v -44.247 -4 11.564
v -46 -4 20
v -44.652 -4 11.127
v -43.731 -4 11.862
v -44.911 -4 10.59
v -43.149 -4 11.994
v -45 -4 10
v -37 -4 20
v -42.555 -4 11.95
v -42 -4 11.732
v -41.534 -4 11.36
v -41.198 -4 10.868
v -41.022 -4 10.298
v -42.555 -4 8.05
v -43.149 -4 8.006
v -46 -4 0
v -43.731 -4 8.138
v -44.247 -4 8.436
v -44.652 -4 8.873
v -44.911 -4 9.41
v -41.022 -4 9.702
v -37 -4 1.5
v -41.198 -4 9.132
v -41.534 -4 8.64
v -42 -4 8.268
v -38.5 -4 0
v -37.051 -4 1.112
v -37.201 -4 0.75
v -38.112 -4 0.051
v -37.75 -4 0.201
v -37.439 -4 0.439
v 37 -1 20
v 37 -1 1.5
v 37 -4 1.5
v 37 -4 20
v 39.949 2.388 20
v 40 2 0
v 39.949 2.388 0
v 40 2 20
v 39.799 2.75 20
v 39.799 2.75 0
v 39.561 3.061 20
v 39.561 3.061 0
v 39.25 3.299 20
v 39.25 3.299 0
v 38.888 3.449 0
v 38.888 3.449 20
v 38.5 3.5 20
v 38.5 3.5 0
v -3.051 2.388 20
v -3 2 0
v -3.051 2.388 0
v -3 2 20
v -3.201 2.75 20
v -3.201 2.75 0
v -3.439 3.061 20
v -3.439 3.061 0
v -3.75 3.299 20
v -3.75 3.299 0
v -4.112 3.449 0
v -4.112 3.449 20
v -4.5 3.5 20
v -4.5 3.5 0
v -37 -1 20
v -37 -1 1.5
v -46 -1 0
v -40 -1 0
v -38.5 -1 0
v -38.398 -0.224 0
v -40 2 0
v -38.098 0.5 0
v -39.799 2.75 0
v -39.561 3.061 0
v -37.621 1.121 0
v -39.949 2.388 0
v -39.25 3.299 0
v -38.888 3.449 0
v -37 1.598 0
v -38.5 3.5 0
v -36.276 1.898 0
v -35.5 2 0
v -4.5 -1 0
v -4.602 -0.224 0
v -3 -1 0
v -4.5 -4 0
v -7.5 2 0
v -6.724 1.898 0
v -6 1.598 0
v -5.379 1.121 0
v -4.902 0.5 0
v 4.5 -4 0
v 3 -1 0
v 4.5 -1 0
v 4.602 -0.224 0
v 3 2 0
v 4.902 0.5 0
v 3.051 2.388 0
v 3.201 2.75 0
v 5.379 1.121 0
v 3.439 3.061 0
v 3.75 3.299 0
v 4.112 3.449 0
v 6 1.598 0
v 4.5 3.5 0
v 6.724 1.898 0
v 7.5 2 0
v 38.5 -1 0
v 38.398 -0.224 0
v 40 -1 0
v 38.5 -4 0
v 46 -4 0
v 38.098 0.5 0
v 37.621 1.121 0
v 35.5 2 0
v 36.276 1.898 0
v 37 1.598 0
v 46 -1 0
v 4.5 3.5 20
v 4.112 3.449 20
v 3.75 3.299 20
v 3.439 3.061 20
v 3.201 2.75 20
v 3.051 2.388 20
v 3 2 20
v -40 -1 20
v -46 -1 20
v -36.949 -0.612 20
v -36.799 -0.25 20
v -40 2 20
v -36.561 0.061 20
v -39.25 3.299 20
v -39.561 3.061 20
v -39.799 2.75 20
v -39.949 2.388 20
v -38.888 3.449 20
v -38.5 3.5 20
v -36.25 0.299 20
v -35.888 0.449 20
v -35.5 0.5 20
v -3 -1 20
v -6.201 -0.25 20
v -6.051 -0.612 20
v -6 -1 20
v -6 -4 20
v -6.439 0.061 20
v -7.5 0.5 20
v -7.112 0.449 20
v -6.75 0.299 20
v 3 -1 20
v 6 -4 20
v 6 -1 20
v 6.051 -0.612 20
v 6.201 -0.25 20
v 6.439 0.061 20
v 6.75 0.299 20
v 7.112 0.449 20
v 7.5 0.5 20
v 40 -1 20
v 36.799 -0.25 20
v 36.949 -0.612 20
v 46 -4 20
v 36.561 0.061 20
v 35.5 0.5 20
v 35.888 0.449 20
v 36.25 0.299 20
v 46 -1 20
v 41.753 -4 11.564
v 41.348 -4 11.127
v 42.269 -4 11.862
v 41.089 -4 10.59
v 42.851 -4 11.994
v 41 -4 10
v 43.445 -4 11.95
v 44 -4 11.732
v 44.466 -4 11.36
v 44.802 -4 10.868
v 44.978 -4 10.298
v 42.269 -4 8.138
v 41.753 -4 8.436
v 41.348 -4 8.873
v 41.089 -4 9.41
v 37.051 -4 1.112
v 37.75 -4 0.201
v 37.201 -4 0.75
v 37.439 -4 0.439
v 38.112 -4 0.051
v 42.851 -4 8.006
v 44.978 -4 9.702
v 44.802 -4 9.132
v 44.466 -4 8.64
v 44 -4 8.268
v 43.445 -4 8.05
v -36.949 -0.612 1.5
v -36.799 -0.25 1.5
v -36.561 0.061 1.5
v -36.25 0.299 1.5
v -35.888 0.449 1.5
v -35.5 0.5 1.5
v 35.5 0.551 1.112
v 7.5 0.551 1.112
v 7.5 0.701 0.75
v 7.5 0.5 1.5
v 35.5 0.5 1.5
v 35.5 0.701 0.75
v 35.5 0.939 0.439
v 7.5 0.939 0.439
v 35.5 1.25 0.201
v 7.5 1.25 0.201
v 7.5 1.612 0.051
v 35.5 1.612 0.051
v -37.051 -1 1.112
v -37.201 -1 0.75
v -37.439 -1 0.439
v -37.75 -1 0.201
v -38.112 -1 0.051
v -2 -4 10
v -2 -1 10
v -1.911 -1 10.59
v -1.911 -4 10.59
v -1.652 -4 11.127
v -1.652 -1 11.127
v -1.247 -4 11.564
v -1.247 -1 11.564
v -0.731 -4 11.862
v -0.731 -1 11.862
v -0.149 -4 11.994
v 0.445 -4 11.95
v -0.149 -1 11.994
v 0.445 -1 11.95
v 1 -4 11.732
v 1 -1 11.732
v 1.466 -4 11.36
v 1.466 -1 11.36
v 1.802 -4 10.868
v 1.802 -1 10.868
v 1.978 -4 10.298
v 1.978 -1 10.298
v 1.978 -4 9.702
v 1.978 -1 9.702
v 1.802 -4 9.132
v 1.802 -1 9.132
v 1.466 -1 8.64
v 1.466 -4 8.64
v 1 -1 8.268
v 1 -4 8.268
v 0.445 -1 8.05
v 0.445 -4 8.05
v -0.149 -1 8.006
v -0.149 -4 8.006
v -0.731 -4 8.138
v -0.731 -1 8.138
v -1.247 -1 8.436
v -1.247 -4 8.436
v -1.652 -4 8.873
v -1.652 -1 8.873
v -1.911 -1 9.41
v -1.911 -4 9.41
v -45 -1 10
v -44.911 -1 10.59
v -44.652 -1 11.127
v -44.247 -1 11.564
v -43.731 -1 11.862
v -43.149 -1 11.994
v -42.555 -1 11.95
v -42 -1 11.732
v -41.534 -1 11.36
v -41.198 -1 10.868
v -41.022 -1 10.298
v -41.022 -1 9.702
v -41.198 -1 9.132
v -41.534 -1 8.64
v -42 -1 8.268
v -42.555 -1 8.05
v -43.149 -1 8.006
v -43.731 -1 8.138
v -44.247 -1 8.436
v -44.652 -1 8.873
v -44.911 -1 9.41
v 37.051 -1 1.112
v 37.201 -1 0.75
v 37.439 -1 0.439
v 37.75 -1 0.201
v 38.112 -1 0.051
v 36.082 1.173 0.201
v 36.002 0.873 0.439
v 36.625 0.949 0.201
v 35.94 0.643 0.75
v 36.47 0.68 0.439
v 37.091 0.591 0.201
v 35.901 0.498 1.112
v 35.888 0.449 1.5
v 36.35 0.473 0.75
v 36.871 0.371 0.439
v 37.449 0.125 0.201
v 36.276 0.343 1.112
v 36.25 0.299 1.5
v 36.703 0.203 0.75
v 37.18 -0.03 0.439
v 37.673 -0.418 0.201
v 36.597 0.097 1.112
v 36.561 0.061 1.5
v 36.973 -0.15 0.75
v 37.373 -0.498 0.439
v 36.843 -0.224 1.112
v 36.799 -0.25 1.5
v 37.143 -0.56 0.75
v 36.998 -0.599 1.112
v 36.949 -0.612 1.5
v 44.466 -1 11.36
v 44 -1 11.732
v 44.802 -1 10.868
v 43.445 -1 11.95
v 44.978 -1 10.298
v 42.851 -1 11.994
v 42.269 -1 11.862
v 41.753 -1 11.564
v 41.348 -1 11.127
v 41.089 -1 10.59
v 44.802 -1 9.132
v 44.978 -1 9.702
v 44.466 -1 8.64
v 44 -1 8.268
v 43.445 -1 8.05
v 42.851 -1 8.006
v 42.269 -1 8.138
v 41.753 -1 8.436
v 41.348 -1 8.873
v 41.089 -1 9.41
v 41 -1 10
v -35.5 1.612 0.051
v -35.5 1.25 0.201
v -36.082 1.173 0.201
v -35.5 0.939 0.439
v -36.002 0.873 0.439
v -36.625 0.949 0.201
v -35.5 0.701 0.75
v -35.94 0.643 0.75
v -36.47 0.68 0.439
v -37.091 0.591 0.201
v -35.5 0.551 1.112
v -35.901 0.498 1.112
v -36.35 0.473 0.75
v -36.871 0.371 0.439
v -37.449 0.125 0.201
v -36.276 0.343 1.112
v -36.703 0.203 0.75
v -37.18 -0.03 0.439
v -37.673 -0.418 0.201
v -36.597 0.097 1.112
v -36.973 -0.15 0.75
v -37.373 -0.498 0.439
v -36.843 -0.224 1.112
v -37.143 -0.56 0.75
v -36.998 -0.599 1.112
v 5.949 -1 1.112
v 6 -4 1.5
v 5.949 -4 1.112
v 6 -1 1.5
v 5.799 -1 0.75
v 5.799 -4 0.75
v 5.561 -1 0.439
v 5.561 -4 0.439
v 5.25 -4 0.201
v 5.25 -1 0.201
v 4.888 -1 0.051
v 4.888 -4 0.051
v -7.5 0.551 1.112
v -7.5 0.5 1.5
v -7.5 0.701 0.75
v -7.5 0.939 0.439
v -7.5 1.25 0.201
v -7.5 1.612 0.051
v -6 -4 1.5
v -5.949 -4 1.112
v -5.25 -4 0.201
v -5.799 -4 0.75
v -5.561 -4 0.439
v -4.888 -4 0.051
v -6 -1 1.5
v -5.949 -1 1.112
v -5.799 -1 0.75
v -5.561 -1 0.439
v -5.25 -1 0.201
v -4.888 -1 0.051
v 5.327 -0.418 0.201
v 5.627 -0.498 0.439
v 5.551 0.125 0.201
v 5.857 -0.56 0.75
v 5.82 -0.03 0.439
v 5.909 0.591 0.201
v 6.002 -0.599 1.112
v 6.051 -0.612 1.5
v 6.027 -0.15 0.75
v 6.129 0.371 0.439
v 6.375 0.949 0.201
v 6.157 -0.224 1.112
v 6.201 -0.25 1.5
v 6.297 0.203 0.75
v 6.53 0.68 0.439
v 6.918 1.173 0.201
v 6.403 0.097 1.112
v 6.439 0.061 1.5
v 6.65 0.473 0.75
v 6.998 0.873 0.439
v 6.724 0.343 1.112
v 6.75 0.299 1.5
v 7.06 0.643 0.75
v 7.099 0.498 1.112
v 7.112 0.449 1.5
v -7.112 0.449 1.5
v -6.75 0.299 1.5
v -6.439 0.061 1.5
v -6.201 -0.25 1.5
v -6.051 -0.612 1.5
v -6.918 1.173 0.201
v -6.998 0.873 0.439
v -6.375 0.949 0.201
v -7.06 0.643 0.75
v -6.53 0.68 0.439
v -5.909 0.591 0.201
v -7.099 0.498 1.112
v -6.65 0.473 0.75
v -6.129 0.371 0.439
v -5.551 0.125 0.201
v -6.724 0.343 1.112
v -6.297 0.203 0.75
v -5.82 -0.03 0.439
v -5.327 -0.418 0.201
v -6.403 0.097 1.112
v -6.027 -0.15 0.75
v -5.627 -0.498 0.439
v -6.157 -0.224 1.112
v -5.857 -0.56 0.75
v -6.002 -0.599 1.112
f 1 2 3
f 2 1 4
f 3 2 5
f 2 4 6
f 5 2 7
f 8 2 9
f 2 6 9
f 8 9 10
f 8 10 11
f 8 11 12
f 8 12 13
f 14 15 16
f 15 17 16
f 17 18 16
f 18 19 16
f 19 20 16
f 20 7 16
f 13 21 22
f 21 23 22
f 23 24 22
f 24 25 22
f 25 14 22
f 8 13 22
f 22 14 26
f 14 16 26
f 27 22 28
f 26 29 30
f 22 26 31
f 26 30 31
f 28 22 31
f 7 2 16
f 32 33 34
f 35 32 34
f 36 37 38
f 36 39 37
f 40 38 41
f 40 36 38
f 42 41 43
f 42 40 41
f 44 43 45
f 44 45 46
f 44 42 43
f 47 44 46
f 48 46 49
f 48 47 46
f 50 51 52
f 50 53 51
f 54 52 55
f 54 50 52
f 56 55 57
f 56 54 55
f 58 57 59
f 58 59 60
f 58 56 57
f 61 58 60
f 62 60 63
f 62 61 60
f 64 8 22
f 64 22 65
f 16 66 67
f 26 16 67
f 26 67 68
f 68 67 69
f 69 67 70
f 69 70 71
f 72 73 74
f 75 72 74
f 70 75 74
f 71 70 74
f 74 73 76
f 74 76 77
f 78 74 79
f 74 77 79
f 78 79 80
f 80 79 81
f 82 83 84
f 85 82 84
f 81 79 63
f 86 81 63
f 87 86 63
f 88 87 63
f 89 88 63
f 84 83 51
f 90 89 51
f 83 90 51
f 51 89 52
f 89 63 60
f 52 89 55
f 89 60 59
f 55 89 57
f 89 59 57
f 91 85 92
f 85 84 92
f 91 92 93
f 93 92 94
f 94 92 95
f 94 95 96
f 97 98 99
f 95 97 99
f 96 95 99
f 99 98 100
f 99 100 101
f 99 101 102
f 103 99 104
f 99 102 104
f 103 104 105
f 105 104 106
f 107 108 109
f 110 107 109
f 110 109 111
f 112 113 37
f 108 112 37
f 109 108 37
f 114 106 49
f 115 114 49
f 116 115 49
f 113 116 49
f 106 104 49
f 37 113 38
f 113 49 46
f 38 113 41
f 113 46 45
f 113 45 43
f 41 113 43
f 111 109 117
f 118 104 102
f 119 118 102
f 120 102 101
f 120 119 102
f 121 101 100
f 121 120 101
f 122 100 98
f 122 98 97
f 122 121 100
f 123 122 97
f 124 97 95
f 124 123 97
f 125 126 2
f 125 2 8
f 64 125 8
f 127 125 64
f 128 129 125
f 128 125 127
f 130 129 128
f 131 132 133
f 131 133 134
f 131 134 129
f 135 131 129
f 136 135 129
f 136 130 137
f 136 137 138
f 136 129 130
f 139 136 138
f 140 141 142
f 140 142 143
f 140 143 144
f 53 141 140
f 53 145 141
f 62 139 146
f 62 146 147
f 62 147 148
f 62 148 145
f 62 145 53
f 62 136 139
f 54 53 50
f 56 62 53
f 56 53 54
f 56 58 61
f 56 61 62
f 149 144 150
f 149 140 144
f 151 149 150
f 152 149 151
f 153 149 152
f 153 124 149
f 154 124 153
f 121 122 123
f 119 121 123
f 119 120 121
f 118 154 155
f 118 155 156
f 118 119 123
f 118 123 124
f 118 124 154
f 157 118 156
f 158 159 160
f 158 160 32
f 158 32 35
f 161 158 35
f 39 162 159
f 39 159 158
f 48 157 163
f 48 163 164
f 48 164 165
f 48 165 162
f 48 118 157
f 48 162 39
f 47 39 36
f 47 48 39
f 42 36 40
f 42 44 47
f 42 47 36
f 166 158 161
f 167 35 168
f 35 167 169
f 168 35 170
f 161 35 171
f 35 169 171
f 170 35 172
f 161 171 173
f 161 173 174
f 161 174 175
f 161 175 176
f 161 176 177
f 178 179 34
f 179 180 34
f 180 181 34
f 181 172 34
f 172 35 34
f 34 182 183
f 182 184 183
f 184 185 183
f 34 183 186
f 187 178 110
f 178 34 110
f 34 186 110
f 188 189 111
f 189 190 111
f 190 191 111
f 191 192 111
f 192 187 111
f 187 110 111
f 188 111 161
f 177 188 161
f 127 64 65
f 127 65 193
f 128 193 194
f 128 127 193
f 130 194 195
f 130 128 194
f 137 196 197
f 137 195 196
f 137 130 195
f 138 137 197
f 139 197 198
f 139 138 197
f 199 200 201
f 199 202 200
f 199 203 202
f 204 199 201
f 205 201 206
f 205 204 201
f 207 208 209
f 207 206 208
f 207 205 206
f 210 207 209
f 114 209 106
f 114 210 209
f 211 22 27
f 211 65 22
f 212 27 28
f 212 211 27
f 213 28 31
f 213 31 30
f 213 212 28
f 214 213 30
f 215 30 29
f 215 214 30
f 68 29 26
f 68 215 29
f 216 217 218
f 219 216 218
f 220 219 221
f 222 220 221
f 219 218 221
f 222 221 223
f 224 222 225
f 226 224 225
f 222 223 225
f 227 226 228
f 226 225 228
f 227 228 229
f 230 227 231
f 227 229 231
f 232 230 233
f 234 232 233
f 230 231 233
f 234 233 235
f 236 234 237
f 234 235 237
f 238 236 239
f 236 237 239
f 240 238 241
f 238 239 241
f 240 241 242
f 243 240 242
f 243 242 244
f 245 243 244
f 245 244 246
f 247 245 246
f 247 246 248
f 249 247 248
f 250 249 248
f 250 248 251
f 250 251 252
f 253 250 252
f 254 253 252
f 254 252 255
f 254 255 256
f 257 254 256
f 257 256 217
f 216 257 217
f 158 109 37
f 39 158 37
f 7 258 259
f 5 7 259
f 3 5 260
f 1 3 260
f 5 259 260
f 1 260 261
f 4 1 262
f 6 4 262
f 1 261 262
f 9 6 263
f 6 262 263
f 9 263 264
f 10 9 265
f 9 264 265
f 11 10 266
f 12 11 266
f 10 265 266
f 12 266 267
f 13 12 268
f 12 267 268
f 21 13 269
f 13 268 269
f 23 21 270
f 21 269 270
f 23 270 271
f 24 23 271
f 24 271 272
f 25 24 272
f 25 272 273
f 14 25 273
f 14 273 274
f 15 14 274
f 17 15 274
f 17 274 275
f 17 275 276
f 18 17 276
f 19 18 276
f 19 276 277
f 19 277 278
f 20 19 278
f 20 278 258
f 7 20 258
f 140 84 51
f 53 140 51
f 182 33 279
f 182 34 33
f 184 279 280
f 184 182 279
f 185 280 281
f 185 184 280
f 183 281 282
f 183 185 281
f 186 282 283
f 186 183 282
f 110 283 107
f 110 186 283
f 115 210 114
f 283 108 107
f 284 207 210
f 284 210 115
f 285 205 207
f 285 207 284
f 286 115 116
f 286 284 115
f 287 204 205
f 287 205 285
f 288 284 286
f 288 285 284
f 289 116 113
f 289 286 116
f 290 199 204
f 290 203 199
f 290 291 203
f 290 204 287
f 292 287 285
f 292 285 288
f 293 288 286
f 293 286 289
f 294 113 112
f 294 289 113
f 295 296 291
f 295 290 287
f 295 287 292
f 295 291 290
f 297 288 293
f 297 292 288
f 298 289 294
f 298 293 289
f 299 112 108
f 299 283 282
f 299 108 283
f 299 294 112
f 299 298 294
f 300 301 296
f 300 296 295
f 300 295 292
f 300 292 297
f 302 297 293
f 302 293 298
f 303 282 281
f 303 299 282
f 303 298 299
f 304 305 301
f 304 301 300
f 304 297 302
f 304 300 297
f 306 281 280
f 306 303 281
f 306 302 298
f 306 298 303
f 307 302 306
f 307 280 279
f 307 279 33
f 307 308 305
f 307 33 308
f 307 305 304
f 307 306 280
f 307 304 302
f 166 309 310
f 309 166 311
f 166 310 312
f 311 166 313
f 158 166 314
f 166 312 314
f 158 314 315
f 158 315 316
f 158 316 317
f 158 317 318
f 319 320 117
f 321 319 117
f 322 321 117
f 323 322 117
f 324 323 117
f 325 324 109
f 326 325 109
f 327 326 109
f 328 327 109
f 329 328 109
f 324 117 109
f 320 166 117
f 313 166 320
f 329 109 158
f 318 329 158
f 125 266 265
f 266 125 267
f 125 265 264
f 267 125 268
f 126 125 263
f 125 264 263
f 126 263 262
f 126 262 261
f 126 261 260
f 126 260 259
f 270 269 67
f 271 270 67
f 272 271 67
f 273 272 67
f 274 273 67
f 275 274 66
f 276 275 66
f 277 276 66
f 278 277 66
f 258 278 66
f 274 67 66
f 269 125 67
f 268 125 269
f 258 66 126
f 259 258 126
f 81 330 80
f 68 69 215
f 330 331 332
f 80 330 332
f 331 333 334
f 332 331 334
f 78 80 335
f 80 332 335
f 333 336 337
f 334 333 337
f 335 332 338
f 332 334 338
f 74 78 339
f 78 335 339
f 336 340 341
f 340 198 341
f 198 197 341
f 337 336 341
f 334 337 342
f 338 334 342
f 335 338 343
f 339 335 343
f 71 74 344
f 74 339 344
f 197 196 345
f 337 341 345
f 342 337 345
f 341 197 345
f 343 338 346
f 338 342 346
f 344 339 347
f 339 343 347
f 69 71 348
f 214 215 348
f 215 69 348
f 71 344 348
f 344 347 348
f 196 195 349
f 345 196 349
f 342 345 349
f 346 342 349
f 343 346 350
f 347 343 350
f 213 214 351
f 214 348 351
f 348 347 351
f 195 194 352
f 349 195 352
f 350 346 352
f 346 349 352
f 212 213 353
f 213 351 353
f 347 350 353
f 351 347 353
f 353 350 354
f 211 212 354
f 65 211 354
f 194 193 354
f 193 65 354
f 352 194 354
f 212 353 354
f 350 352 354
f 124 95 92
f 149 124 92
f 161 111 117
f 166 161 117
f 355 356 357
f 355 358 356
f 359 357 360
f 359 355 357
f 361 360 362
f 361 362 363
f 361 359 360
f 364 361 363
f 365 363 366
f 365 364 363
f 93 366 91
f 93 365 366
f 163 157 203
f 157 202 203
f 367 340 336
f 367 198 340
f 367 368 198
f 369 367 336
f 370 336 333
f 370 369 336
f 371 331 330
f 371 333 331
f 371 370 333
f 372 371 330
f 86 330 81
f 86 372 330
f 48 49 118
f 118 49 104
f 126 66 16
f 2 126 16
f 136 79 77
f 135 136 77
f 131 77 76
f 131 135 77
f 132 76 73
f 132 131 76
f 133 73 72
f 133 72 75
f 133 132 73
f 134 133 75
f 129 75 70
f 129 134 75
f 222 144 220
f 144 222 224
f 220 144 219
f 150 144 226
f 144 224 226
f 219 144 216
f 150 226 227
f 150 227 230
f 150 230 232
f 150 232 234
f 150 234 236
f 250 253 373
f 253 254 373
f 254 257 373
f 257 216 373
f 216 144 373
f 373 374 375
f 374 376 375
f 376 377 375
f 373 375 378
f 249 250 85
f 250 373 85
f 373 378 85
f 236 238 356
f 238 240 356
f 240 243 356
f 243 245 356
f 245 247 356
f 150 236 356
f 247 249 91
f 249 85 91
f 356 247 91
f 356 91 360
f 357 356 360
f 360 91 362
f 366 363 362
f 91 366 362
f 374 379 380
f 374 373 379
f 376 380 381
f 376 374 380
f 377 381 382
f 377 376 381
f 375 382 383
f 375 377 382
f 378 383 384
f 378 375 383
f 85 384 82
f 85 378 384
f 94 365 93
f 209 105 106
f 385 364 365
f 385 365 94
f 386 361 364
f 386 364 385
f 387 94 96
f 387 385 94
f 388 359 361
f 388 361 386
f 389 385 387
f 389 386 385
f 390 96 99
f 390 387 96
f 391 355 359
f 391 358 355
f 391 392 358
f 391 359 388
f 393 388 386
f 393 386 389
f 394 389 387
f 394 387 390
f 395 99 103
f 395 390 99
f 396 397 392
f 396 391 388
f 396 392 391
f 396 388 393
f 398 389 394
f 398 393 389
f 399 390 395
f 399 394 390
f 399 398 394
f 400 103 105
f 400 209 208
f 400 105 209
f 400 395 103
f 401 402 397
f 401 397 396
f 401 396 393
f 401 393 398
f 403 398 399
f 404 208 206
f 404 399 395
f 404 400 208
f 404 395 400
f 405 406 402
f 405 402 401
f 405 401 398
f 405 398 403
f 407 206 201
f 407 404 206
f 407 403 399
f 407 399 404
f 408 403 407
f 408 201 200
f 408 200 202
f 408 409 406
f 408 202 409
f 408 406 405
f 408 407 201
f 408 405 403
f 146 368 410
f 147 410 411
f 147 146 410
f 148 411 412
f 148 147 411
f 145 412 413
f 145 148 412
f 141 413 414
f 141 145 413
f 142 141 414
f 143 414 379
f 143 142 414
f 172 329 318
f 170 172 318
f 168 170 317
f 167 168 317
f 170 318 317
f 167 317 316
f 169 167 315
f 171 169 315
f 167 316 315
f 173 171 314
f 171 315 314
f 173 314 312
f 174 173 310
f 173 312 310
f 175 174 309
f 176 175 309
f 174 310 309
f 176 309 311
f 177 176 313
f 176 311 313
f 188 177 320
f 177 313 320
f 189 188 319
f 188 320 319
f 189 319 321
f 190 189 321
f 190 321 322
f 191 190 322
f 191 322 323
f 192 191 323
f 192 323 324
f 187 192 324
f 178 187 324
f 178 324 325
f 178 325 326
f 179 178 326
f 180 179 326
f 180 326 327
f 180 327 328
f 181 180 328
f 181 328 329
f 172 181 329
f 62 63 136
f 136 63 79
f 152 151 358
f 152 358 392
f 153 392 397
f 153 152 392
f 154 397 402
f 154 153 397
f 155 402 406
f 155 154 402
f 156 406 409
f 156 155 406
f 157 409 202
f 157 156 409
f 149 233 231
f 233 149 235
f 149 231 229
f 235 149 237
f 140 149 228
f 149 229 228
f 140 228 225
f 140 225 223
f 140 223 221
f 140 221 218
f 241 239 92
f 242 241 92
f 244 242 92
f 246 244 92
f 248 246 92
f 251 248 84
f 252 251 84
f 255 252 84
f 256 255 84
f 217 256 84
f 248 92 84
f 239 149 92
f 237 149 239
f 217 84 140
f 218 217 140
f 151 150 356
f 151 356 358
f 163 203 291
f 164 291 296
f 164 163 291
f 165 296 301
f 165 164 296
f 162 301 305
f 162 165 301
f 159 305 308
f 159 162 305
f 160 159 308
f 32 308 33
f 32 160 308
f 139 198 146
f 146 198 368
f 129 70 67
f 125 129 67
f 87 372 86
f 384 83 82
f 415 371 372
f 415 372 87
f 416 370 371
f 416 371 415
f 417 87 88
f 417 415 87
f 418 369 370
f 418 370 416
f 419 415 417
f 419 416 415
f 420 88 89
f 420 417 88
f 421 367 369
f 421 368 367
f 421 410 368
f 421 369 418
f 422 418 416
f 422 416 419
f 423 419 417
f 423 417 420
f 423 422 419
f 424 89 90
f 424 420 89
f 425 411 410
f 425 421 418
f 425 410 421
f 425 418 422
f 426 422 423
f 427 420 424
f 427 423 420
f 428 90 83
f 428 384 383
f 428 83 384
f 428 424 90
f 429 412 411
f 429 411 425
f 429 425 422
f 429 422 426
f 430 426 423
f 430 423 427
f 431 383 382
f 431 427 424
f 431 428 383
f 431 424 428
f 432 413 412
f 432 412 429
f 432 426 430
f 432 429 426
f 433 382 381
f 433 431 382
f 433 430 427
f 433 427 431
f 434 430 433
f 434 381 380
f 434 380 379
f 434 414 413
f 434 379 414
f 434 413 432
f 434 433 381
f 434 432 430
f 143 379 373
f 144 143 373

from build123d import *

# Parameters (mm, degrees)
F1_DEPTH = 20
F2_R     = 1.5
F3_R     = 2
F4_DEPTH = 25


with BuildPart() as f1:
    # F0 (on Top) → F1 (new body)
    with BuildSketch(Plane.XY):
        Polygon((-40, -4), (-37, -4), (-37, 0.5), (-6, 0.5), (-6, -4), (6, -4), (6, 0.5), (37, 0.5), (37, -4), (40, -4), (46, -4), (46, -1), (40, -1), (40, 3.5), (3, 3.5), (3, -1), (0, -1), (-3, -1), (-3, 3.5), (-40, 3.5), (-40, -1), (-46, -1), (-46, -4), align=None)
    extrude(amount=F1_DEPTH)

    # F2
    f2_edges = [f1.edges().sort_by_distance(p)[0] for p in [
        (-21.5, 0.5, 0),
        (-37, -1.75, 0),
        (-6, -1.75, 0),
        (6, -1.75, 0),
        (21.5, 0.5, 0),
        (37, -1.75, 0),
        (-40, 3.5, 10),
        (-3, 3.5, 10),
        (3, 3.5, 10),
        (40, 3.5, 10),
        (-37, 0.5, 10),
        (-6, 0.5, 10),
        (6, 0.5, 10),
        (37, 0.5, 10),
    ]]
    fillet(f2_edges, radius=F2_R)

    # F3 (on face) → F4 (cut)
    with BuildSketch(Plane(origin=(0, -1, 0), x_dir=(-1, 0, 0), z_dir=(0, 1, 0))):
        with Locations((-43, 10)):
            Circle(F3_R)
        with Locations((0, 10)):
            Circle(F3_R)
        with Locations((43, 10)):
            Circle(F3_R)
    extrude(amount=-F4_DEPTH, mode=Mode.SUBTRACT)


solid = f1.part
